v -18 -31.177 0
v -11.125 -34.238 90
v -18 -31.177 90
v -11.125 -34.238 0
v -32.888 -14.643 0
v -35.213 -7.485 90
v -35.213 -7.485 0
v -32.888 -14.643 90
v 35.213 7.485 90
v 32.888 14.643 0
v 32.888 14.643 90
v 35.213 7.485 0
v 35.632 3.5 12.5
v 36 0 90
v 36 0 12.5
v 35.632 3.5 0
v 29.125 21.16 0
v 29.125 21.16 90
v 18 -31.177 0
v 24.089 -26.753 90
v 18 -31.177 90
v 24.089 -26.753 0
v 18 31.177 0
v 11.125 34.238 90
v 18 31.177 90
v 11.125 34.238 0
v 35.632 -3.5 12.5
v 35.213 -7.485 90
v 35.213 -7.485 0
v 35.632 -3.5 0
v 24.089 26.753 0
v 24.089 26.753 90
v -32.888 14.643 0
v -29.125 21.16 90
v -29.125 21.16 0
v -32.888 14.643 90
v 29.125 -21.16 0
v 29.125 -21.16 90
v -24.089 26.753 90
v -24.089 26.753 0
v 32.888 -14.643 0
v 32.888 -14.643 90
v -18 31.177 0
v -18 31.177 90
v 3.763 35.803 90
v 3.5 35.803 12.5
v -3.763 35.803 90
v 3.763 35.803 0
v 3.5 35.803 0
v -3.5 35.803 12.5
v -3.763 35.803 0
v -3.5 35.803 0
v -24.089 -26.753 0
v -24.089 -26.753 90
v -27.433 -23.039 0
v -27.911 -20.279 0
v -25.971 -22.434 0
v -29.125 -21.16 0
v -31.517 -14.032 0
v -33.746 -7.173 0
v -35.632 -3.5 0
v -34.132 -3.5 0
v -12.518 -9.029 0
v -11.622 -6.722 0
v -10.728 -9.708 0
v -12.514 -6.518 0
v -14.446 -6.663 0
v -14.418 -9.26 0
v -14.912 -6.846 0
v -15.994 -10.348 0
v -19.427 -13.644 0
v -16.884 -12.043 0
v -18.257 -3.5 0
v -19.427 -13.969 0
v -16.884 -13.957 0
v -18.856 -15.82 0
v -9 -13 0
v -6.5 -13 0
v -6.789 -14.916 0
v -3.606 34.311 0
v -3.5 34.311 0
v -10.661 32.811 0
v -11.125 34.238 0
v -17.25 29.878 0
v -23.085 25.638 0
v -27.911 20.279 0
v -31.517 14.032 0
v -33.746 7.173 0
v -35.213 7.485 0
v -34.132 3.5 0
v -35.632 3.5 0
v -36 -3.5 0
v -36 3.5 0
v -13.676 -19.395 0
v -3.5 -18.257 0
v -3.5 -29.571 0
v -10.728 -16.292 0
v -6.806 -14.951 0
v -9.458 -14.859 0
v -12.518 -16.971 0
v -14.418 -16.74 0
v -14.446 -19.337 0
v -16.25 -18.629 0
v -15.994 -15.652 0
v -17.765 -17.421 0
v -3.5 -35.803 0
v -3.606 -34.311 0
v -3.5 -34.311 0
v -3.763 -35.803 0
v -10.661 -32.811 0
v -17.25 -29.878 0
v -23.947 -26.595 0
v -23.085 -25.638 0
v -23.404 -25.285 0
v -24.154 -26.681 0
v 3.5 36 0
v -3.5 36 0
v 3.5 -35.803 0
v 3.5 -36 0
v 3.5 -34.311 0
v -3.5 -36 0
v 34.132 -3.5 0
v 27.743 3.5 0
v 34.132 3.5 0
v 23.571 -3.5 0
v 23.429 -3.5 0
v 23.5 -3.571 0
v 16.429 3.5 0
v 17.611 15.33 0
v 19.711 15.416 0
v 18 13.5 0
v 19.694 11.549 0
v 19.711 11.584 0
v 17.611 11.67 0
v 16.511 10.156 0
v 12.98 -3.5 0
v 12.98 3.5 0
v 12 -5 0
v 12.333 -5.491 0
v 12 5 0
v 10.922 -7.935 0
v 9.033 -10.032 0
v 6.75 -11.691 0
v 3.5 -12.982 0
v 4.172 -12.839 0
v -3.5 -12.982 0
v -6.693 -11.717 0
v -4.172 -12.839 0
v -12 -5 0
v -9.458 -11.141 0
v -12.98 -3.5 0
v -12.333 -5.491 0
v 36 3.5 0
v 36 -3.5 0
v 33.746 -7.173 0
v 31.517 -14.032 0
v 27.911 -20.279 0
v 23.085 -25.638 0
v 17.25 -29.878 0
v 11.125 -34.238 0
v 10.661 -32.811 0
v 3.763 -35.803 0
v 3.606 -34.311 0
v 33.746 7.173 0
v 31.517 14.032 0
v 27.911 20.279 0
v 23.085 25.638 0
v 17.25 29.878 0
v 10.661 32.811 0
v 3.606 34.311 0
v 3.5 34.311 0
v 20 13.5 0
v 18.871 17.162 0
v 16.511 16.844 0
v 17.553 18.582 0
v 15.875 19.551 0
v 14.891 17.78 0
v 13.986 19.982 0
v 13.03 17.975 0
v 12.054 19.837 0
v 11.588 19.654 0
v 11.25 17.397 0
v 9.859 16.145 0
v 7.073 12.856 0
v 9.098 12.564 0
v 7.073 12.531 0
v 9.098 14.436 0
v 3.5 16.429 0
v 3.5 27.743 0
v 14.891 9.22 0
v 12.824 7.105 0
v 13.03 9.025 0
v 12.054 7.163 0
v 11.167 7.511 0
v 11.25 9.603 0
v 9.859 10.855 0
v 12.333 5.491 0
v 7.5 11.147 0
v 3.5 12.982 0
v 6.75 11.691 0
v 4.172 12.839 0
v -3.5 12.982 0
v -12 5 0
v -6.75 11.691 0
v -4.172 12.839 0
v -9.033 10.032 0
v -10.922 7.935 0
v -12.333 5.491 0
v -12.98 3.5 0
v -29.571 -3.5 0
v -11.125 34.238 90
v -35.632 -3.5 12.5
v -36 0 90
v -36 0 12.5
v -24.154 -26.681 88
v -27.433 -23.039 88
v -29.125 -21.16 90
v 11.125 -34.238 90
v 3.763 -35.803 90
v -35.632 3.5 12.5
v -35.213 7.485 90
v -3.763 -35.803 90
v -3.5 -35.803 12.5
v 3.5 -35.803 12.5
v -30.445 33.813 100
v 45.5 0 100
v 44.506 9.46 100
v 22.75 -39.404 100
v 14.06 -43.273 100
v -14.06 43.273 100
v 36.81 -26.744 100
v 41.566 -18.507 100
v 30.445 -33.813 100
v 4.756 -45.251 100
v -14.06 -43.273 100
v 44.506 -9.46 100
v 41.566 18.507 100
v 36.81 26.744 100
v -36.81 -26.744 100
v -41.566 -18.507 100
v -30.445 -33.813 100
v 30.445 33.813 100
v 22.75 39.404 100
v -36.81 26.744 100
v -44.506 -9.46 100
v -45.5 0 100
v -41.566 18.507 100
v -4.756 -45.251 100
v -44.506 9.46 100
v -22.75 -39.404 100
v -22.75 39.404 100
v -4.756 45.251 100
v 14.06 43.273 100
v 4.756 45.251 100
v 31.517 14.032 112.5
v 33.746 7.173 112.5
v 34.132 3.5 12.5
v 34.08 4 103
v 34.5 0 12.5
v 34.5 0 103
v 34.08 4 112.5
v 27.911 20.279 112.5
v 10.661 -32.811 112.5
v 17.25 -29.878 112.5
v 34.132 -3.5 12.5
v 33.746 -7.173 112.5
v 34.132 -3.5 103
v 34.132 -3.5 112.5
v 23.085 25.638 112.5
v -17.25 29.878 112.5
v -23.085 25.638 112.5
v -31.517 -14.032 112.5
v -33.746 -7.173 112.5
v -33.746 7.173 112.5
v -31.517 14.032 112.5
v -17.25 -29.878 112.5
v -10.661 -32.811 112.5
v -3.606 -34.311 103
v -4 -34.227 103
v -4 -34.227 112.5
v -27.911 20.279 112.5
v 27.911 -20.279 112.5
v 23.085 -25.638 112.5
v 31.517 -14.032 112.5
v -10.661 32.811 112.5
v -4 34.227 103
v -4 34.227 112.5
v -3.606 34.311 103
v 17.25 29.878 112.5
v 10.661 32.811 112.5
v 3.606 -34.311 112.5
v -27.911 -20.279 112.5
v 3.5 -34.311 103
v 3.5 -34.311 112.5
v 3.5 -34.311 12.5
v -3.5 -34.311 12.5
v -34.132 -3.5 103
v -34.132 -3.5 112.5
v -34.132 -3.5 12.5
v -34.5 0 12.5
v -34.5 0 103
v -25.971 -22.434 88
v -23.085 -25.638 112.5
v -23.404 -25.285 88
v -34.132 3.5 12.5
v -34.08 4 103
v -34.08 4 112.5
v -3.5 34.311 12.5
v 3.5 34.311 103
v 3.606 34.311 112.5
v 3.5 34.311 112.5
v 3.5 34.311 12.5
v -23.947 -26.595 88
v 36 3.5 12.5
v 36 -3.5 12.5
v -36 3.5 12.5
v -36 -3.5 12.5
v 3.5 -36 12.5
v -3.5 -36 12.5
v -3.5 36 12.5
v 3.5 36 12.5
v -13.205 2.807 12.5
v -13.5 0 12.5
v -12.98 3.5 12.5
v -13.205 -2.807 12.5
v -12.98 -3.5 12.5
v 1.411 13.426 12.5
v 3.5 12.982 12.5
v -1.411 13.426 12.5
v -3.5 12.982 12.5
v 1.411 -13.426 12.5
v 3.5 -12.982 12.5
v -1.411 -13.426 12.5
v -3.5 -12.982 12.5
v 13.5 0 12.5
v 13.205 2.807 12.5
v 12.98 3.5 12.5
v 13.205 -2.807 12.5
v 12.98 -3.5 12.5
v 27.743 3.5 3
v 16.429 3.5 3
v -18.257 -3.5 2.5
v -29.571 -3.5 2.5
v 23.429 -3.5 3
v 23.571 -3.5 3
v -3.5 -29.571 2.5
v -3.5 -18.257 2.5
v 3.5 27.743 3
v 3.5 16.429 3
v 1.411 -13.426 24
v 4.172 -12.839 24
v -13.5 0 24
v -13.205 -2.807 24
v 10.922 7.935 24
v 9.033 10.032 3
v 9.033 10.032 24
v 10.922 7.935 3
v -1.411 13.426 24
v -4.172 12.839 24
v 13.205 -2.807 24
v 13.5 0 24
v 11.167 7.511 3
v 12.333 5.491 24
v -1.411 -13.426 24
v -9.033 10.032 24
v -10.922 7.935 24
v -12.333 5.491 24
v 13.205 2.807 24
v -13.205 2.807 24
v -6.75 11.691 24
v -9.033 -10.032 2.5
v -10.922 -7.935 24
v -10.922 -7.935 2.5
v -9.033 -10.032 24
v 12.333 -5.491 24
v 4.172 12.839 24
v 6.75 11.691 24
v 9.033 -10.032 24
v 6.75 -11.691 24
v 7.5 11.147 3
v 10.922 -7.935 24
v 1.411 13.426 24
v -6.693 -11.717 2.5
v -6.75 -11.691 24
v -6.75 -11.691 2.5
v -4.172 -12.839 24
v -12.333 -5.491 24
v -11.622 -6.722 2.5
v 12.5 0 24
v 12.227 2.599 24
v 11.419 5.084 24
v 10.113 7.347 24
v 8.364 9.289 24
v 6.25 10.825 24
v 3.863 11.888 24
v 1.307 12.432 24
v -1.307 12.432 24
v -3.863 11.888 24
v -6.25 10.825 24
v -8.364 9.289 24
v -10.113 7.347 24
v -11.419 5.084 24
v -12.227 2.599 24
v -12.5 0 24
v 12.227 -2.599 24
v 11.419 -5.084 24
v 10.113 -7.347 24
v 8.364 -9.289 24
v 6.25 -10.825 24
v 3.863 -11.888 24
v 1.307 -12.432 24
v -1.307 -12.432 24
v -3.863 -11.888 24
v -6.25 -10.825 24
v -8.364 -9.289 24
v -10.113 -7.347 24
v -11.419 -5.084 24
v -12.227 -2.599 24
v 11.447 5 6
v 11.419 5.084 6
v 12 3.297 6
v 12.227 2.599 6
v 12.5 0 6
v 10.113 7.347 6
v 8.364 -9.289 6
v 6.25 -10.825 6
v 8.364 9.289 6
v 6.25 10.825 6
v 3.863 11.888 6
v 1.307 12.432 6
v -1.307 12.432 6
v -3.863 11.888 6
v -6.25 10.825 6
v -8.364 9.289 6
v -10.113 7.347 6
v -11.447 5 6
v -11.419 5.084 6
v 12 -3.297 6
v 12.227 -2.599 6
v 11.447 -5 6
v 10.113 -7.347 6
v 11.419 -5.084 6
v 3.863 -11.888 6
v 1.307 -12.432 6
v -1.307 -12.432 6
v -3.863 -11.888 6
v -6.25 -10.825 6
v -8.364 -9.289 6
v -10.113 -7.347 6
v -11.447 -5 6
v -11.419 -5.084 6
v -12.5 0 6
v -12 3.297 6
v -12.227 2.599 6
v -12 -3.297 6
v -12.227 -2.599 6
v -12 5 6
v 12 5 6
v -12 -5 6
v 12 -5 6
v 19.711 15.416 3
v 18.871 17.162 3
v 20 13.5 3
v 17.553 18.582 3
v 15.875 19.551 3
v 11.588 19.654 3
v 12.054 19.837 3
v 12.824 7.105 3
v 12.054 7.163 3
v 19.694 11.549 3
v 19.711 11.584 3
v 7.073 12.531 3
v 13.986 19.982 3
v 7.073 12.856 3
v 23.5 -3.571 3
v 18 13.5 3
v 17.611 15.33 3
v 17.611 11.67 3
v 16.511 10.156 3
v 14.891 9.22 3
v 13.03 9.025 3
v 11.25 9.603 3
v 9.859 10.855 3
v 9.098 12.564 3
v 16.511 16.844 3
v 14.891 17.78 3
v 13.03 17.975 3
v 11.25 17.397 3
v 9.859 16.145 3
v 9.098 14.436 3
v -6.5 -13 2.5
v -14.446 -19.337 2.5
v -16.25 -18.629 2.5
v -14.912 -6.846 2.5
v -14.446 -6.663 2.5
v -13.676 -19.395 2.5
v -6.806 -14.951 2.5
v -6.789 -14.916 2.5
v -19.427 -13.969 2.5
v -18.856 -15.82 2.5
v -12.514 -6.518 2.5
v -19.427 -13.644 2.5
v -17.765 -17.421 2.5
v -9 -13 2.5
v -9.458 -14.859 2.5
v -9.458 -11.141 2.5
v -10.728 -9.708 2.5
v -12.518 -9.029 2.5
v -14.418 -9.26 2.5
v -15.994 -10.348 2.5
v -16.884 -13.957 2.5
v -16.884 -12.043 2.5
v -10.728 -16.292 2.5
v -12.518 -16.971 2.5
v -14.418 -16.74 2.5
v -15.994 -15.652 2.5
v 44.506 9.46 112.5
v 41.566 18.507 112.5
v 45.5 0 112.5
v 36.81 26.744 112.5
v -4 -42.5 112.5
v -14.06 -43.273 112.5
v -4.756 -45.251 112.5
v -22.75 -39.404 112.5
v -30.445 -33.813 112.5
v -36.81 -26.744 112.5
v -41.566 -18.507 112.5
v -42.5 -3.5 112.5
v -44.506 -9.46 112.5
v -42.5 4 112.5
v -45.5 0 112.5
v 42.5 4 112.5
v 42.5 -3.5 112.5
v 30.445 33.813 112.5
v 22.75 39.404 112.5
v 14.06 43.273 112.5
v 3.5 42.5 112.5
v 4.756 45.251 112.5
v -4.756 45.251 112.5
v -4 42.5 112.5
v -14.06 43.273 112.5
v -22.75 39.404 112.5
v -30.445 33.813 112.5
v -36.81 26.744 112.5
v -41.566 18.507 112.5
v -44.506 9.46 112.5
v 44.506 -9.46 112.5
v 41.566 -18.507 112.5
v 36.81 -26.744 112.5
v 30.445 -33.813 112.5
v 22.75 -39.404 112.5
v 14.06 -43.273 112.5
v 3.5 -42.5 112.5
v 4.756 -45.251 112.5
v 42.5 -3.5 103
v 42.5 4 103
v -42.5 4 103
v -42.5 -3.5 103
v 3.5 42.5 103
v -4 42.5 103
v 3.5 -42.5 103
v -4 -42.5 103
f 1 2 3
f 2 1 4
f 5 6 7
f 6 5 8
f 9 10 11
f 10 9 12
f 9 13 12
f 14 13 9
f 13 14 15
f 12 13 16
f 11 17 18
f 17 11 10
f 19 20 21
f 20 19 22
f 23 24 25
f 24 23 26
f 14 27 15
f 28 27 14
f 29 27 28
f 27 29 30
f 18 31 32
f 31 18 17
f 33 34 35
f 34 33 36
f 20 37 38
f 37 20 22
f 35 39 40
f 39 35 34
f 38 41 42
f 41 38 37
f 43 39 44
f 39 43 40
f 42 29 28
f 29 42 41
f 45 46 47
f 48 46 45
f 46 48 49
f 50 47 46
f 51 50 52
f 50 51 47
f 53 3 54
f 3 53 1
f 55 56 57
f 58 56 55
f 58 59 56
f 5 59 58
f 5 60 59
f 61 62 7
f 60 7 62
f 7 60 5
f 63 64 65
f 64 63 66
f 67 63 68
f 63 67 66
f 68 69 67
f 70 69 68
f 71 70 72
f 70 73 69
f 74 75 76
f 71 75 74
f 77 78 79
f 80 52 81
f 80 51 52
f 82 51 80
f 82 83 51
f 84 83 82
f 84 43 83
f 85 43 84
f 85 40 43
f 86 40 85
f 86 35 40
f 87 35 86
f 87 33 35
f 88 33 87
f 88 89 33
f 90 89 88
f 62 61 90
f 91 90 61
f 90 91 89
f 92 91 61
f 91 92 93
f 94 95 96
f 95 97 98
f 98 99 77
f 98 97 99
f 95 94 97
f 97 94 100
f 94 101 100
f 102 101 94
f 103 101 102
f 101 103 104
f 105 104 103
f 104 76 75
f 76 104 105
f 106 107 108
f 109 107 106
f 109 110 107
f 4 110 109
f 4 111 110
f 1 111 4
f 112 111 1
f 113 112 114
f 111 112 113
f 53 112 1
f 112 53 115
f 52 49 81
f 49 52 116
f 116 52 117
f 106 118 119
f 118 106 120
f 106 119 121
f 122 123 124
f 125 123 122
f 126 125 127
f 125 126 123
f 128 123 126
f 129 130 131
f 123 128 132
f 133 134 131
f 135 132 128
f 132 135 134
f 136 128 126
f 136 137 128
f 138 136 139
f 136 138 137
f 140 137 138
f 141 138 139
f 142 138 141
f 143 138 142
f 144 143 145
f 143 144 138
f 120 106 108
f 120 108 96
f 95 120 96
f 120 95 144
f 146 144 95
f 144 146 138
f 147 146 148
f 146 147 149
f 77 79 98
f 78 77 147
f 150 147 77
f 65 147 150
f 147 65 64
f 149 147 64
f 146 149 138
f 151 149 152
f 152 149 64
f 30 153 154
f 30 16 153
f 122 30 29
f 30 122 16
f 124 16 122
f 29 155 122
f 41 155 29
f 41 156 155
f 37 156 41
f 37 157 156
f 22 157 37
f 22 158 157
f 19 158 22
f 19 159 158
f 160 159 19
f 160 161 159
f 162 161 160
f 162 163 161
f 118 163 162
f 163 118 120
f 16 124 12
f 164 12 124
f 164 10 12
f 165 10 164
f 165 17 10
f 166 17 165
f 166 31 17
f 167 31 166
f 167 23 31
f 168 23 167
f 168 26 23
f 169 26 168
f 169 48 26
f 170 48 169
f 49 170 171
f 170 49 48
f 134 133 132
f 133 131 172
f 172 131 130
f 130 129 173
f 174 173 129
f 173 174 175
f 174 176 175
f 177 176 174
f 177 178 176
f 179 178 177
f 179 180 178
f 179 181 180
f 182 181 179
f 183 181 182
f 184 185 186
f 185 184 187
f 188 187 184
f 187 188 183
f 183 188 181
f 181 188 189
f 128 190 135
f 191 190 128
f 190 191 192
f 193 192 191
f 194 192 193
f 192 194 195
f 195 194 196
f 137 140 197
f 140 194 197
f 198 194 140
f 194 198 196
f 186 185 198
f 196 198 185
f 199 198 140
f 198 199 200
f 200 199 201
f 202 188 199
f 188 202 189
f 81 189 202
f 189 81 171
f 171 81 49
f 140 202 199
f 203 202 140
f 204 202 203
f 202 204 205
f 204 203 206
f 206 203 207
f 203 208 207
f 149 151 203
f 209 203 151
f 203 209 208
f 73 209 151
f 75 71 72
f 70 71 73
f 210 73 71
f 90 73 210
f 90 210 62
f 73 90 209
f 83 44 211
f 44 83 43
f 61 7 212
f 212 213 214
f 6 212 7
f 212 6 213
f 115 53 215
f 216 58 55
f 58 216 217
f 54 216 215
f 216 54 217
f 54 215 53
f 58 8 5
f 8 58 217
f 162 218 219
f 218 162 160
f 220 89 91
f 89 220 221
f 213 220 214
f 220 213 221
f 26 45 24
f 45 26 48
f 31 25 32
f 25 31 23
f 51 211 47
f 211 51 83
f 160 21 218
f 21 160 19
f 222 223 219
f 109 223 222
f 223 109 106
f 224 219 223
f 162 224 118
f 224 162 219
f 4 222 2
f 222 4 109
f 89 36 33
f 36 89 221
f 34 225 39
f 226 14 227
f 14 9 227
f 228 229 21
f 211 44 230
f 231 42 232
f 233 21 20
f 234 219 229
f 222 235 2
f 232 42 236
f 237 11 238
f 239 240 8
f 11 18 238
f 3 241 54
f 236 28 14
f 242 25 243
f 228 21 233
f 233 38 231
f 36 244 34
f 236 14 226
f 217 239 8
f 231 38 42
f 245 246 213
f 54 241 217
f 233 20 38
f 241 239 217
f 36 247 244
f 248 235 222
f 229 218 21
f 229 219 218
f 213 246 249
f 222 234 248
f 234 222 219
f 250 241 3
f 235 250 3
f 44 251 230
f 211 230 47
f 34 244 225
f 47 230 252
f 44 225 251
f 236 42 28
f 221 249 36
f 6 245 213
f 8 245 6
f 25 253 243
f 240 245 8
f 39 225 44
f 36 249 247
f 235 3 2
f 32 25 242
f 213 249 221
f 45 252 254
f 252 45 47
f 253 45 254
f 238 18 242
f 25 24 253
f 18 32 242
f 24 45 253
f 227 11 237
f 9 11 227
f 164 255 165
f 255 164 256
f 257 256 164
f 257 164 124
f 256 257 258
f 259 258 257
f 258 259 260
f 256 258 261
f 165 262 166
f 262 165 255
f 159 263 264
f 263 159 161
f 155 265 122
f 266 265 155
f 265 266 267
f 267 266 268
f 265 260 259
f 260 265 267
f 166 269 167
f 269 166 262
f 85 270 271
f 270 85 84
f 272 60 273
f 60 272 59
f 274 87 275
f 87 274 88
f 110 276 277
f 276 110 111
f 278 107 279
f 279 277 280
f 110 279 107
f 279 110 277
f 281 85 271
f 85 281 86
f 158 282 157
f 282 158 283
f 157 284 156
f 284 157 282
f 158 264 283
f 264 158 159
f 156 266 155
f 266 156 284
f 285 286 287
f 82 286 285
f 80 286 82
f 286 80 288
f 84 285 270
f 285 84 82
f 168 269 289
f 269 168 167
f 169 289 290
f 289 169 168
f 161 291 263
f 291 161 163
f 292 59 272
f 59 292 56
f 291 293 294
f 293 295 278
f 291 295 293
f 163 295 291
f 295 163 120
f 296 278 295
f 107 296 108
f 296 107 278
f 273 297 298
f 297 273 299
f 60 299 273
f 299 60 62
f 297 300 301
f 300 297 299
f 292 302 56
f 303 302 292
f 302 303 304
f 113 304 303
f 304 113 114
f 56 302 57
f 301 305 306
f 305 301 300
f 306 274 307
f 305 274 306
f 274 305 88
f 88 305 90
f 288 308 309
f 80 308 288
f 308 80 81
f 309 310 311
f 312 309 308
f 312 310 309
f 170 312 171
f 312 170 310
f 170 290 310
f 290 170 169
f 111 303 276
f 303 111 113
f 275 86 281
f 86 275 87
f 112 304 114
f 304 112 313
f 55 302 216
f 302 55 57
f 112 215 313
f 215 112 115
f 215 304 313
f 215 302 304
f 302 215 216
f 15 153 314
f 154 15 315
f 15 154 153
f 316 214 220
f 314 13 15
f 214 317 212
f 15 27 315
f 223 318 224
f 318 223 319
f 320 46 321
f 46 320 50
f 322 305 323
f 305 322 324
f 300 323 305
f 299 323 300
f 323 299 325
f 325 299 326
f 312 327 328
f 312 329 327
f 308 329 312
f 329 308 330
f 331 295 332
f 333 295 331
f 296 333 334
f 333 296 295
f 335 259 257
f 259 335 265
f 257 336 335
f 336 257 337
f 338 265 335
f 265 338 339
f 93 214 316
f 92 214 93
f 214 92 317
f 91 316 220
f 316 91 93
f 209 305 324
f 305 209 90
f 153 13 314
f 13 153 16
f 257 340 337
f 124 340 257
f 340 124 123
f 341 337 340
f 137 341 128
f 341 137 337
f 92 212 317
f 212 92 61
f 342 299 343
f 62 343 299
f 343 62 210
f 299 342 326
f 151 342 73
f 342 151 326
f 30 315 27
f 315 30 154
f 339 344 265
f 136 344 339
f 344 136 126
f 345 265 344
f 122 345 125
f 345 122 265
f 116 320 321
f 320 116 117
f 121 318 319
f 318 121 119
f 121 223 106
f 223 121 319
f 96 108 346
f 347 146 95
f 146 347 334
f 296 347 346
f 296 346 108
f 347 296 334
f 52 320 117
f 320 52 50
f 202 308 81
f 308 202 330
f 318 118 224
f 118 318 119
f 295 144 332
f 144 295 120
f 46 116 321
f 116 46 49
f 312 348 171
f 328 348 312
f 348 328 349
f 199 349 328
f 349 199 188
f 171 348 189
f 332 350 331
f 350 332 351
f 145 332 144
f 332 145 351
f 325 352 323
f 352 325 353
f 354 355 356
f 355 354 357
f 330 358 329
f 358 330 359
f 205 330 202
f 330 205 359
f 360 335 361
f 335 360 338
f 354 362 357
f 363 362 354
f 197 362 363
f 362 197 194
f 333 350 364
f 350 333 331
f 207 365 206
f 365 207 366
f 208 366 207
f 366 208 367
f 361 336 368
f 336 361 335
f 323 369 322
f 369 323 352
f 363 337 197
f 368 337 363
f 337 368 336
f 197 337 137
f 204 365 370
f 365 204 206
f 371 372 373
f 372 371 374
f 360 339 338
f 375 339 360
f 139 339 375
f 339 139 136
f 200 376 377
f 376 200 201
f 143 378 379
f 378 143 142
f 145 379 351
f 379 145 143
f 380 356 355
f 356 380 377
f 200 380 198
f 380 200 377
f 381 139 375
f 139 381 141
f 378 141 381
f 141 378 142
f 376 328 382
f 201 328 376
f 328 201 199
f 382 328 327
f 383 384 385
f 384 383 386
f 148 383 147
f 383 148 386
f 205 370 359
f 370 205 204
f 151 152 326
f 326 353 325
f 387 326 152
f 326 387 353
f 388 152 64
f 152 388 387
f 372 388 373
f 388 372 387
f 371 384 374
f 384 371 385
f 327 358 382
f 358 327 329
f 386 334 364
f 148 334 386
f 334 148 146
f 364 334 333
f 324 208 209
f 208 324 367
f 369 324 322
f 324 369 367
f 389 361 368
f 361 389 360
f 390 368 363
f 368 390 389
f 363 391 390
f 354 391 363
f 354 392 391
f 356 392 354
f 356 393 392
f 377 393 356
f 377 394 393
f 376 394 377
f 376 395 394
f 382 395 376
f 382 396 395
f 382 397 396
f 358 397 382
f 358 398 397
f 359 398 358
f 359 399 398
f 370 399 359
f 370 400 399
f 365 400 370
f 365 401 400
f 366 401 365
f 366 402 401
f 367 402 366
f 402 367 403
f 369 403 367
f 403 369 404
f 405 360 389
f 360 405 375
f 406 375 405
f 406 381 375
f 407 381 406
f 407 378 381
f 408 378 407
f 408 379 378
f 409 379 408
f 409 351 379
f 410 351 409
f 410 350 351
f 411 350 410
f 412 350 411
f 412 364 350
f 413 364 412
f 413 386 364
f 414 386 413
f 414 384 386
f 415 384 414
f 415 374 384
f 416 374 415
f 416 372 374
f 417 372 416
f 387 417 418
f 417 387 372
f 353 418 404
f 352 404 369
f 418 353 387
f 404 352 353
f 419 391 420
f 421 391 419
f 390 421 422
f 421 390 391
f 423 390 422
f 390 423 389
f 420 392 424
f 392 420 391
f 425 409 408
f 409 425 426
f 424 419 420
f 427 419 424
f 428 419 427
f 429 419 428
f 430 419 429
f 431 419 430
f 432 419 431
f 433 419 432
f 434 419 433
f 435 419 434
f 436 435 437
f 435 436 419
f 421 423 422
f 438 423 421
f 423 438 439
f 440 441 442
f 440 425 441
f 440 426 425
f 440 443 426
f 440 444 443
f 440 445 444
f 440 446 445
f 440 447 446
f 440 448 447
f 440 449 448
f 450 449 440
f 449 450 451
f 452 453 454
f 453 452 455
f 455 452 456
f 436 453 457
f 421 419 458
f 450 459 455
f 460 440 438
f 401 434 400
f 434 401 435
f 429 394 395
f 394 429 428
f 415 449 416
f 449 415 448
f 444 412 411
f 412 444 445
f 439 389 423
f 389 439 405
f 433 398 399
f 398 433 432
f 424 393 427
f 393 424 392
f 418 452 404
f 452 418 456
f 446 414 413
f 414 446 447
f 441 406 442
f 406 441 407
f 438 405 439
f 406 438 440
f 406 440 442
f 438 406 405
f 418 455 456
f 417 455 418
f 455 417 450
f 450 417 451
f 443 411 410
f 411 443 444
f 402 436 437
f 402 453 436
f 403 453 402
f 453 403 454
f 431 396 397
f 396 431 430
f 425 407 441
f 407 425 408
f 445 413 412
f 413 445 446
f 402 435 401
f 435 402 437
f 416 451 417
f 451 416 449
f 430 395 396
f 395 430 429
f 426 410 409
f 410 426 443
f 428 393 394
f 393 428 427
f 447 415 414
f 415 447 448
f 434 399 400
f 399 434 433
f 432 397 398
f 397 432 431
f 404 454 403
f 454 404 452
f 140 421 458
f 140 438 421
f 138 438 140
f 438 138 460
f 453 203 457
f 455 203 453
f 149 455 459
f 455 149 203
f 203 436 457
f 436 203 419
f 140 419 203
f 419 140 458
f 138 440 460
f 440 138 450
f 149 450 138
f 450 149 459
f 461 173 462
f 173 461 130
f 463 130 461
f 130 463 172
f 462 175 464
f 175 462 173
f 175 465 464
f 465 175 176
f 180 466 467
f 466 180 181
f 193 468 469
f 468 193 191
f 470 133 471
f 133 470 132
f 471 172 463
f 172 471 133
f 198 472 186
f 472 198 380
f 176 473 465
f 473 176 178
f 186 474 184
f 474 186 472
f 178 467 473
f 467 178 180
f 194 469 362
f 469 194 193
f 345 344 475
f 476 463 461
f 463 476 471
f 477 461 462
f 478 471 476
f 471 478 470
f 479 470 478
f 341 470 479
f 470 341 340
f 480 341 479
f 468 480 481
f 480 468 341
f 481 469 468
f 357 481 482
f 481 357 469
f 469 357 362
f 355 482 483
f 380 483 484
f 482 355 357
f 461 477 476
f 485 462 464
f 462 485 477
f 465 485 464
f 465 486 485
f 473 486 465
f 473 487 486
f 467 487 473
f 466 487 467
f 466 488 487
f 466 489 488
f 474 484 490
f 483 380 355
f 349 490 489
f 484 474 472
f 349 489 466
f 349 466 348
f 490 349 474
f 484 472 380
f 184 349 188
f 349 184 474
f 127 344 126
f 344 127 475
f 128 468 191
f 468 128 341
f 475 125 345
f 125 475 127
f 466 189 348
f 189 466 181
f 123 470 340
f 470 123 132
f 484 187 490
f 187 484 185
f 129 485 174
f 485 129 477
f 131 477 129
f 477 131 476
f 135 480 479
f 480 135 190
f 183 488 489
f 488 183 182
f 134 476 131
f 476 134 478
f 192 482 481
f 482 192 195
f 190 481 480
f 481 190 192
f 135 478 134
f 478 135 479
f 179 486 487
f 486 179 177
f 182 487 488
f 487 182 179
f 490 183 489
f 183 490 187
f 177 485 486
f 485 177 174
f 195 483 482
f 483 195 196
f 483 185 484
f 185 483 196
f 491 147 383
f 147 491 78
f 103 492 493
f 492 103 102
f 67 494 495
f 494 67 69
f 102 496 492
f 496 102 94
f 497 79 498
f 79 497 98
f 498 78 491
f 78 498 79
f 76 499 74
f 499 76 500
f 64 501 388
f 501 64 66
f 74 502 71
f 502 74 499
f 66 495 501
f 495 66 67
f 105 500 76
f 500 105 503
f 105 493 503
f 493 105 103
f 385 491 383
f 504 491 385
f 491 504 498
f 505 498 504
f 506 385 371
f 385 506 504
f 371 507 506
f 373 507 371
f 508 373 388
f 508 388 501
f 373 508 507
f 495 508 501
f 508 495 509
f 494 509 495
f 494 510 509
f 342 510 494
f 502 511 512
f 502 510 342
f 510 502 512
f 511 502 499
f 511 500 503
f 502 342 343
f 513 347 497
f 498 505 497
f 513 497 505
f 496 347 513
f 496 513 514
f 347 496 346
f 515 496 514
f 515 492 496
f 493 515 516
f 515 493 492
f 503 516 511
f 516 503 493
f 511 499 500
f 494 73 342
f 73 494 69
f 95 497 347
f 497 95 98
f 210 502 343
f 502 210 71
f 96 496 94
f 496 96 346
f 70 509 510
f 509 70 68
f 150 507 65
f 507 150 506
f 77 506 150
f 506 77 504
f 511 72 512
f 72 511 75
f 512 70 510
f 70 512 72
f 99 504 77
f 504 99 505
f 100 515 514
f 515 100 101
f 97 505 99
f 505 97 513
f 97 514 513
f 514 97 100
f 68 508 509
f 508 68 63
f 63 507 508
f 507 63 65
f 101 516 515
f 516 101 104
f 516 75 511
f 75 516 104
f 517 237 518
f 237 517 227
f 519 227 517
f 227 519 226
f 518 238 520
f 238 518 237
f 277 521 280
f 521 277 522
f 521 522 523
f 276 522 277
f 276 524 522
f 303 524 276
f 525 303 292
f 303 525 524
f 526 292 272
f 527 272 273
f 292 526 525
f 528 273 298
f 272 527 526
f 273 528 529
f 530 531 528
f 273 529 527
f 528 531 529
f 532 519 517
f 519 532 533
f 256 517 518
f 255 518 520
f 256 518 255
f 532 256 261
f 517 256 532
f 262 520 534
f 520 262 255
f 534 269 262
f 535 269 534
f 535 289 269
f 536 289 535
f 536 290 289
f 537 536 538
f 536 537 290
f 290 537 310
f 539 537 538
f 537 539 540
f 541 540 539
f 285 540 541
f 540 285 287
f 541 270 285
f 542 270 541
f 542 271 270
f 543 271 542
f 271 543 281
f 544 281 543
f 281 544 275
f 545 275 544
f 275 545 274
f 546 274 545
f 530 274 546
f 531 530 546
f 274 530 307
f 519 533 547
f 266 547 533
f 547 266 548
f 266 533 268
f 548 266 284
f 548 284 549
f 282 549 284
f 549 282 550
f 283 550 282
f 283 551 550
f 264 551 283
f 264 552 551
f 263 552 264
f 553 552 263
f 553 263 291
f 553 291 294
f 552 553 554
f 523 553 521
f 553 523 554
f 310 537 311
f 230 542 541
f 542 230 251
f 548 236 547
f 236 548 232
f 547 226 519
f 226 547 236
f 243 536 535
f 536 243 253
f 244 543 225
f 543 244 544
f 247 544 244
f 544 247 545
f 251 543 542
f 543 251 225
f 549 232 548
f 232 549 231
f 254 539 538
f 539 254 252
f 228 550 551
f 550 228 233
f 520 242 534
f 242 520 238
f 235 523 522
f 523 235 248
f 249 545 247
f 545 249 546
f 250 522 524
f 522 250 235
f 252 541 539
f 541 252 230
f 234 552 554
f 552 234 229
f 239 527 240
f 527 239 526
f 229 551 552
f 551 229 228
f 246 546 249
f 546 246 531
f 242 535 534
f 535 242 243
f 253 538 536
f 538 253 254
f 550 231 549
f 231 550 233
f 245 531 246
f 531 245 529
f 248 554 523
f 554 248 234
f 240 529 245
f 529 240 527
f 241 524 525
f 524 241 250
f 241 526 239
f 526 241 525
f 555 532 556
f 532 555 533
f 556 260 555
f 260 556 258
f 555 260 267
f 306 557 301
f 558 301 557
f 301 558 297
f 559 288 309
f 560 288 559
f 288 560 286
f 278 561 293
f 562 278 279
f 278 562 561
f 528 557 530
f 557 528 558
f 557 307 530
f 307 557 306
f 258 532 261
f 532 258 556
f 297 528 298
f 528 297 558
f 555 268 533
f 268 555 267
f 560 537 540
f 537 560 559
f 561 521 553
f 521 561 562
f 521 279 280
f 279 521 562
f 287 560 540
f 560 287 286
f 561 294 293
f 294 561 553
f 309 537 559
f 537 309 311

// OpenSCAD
// file: ../components/led.scad
module led(diameter, height, tolerance){
    
    // Add tolerance.
    total_diameter = diameter+tolerance;
    
    // Derive remaining dimensions from the overall measurements.
    lip_radius = total_diameter/2;
    lip_height = 2; // TODO: this probably shouldn't be hard-coded.
    body_radius = (total_diameter-.5)/2;
    dome_radius = body_radius;
    body_height = height-dome_radius;
    
    color("red"){
        // Body.
        cylinder(r=body_radius,h=body_height);
        // Lip.
        cylinder(r=lip_radius,h=lip_height);
        // Dome.
        //translate([0,0,LED_HEIGHT-(LED_DIAMETER/2)]){
        translate([0,0,height-body_radius]){
            sphere(r=dome_radius);
        }
    }
    // Leads.
    color("gray"){
        translate([0,2,-10]){
            cylinder(r=.5,h=10);
        }
        translate([0,-2,-12]){
            cylinder(r=.5,h=12);
        }
    }
}

// Example.
//led(10,13.7,1);
// main file
include <../components/led.scad>

/*
    Electronic "tiki torch" flame module
    
    TODO:
    * Revisit LED wire routing channel (tape isn't great)
    
    Standard canister measurements:
    
    can diameter: ~73mm
    can height: ~112mm
    top height: ~9.5mm
    top diameter: ~91mm
    second top height: ~9.8mm
    second top diameter: ~50mm
    third top height: 8.5mm
    third top di"../components/led.scad"ameter: ~30mm
    
    Wiring notes:
    * red: power in positive (90mm)
    * green: power in gnd (70mm)
    * yellow: motor + (note: wired to - terminal on my motors) (85mm)
    * black: motor - (60mm)
    * LED +/- connected in parallel with power in
*/

CAN_DIAMETER = 72; //73;
CAN_HEIGHT = 100;//112;
FLANGE_DIAMETER = 91;
FLANGE_HEIGHT = 12.5;//9.5;
THREAD_TOP_DIAMETER = 50;
THREAD_TOP_HEIGHT = 9.8;
TIP_DIAMETER = 30;
TIP_HEIGHT = 8.5;

FAN_DEPTH = 20;

MOTOR_DIAMETER = 24;
MOTOR_LENGTH = 30;

WALL_THICKNESS = 3;
TOLERANCE = 1;

// Rotates object around specified point
module rotate_about_pt(z, y, pt) {
    translate(pt)
        rotate([0, y, z])
            translate(-pt)
                children();   
}

// Basic replica of standard fuel canister (for referenece)
module stock_tiki(){
    cylinder(r=CAN_DIAMETER/2,h=CAN_HEIGHT);
    translate([0,0,CAN_HEIGHT]){
        cylinder(r=FLANGE_DIAMETER/2,h=FLANGE_HEIGHT);
        translate([0,0,FLANGE_HEIGHT]){
            cylinder(r=THREAD_TOP_DIAMETER/2,h=THREAD_TOP_HEIGHT);
            translate([0,0,THREAD_TOP_HEIGHT]){
                cylinder(r=TIP_DIAMETER/2,h=TIP_HEIGHT);
            }
        }
    }
}

module fan(){
    
    // A fan with the following constraints:
    // * Flow over pressure
    // * Fits into canister
    // * Works with an off-the-shelf motor (ideally ~3vdc)
    // * Prints without supports
    
    HUB_HEIGHT = 5;
    MOTOR_SHAFT_DIAMETER = 2;
    BLADE_LENGTH = (CAN_DIAMETER/2)-WALL_THICKNESS-TOLERANCE;
    
    $fn=25;
    
    difference(){
        union(){
            
            // hub
            translate([0,0,-.3]){
                cylinder(r=5,h=6);
            }
            
            // blades
            translate([0,0,2.5]){
                rotate([90,30,0]){
                    difference(){
                        resize([10,0,0]){
                            cylinder(r=3/2,h=BLADE_LENGTH);
                        }
                        translate([-2,-0.75,0]){
                            resize([14,0,0]){
                                cylinder(r=3/2,h=BLADE_LENGTH);
                            }
                        }
                    }
                }
            }
            
            translate([0,0,2.5]){
                rotate([90,30,90]){
                    difference(){
                        resize([10,0,0]){
                            cylinder(r=3/2,h=BLADE_LENGTH);
                        }
                        translate([-2,-0.75,0]){
                            resize([14,0,0]){
                                cylinder(r=3/2,h=BLADE_LENGTH);
                            }
                        }
                    }
                }
            }
            
            translate([0,0,2.5]){
                rotate([90,30,180]){
                    difference(){
                        resize([10,0,0]){
                            cylinder(r=3/2,h=BLADE_LENGTH);
                        }
                        translate([-2,-0.75,0]){
                            resize([14,0,0]){
                                cylinder(r=3/2,h=BLADE_LENGTH);
                            }
                        }
                    }
                }
            }
            
            translate([0,0,2.5]){
                rotate([90,30,270]){
                    difference(){
                        resize([10,0,0]){
                            cylinder(r=3/2,h=BLADE_LENGTH);
                        }
                        translate([-2,-0.75,0]){
                            resize([14,0,0]){
                                cylinder(r=3/2,h=BLADE_LENGTH);
                            }
                        }
                    }
                }
            }            
        }
        
        // motor shaft hole
        translate([0,0,-1]){
            cylinder(r=MOTOR_SHAFT_DIAMETER/2,h=HUB_HEIGHT*2);
        }
    }
}

// Fan test
//fan();

module flame_holder(){
    difference(){
        // top flange
        difference(){
            cylinder(r=FLANGE_DIAMETER/2,h=FLANGE_HEIGHT);
            cylinder(r=(CAN_DIAMETER-WALL_THICKNESS)/2,h=FLANGE_HEIGHT);
        }
        
        // Cloth holder mounts
        translate([-(FLANGE_DIAMETER/2)+(WALL_THICKNESS),-WALL_THICKNESS-(TOLERANCE/2),WALL_THICKNESS]){
            cube([FLANGE_DIAMETER-(WALL_THICKNESS*2),(WALL_THICKNESS*2)+TOLERANCE+0.5,FLANGE_HEIGHT]);
            
            rotate_about_pt(90,0,[(FLANGE_DIAMETER-(WALL_THICKNESS*2))/2,WALL_THICKNESS+(TOLERANCE/2)]){
                cube([FLANGE_DIAMETER-(WALL_THICKNESS*2),(WALL_THICKNESS*2)+TOLERANCE+0.5,FLANGE_HEIGHT]);
            }
        }
    }
}

// Flame holder test
//flame_holder();

module flame_clamp(){
        
    // Cloth holder
    difference(){
        union(){
            cube([FLANGE_DIAMETER-(WALL_THICKNESS*3),(WALL_THICKNESS*2)+1,FLANGE_HEIGHT-WALL_THICKNESS]);
            
            // LED mount
            translate([((FLANGE_DIAMETER-(WALL_THICKNESS*3))/2)-10,-2.5,0]){
                cylinder(r=12/2,h=9.5);
            }
        }
        
        // Groove for fabric
        translate([WALL_THICKNESS,WALL_THICKNESS-((WALL_THICKNESS/4)-1),0]){
            cube([FLANGE_DIAMETER-(WALL_THICKNESS*2),WALL_THICKNESS/4,FLANGE_HEIGHT]);
        }
        
        // Hole for LED mount
        translate([((FLANGE_DIAMETER-(WALL_THICKNESS*3))/2)-10,-2.5,0]){
            cylinder(r=10/2,h=10);
        }
        
        // Notch the center so two can overlap
        translate([((FLANGE_DIAMETER-(WALL_THICKNESS*3))/2)-WALL_THICKNESS,0,FLANGE_HEIGHT/2]){
            cube([(WALL_THICKNESS*2)+1,(WALL_THICKNESS*2)+1,FLANGE_HEIGHT/2]);
        }
    }
}

// Flame clamps test
//flame_clamp();


module motor_mount(){    
    difference(){
        union(){
            translate([-(CAN_DIAMETER/2),-WALL_THICKNESS-(TOLERANCE/2),0]){
                cube([CAN_DIAMETER,(WALL_THICKNESS*2)+TOLERANCE,FLANGE_HEIGHT]);
                
                rotate_about_pt(90,0,[CAN_DIAMETER/2,WALL_THICKNESS+(TOLERANCE/2)]){
                    cube([CAN_DIAMETER,(WALL_THICKNESS*2)+TOLERANCE,FLANGE_HEIGHT]);
                }
            }
            cylinder(r=(MOTOR_DIAMETER+WALL_THICKNESS)/2,h=MOTOR_LENGTH*0.80);
        }        
        
        translate([0,0,WALL_THICKNESS*2]){
            cylinder(r=(MOTOR_DIAMETER+TOLERANCE)/2,h=MOTOR_LENGTH);
        }
        
        // Hole for wires
        translate([-MOTOR_DIAMETER/2,-10/2,0]){
            cube([MOTOR_DIAMETER,10,WALL_THICKNESS*2]);
        }        
    }
    
    // TODO: Move all these magic numbers up into constants
    
    // DC jack mount
    // depth: 3mm, diameter: 8mm
    translate([(MOTOR_DIAMETER/2)+1.5,(MOTOR_DIAMETER/2)+1.5,0]){
        difference(){
            union(){
                cylinder(r=(10+WALL_THICKNESS)/2,h=3);
                translate([5,-15,0]){
                    rotate_about_pt(45,0,[5,5]){
                        cube([8,38,3]);
                    }
                }
            }
            cylinder(r=(8+TOLERANCE)/2,h=3);
        }
    }
    
    // Speed control mount
    // depth: 2.5mm, diameter: 7mm
    translate([-(MOTOR_DIAMETER/2)-1,-(MOTOR_DIAMETER/2)-1,0]){
        difference(){
            union(){
                cylinder(r=(10+WALL_THICKNESS)/2,h=2.5);
                translate([5,-15,0]){
                    rotate_about_pt(45,0,[5,5]){
                        cube([8,38,2.5]);
                    }
                }
            }
            cylinder(r=(7+TOLERANCE)/2,h=3);
        }
    }    
}

// Motor mount test
//motor_mount();


// Assemble!
// TODO: Can should be a specific module or perhaps grouped with flame holder
union(){
    difference(){
        union(){
            cylinder(r=CAN_DIAMETER/2,h=CAN_HEIGHT);
            translate([0,0,CAN_HEIGHT-10]){
                cylinder(r1=CAN_DIAMETER/2,r2=FLANGE_DIAMETER/2,h=10);
            }
        }

        translate([0,0,0]){
            cylinder(r=(CAN_DIAMETER-WALL_THICKNESS)/2,h=CAN_HEIGHT+WALL_THICKNESS);
        }
        
        // Add a channel for LED wires
       translate([-CAN_DIAMETER/2.8,-CAN_DIAMETER/2.9,0]){
            cylinder(r=2.5,h=CAN_HEIGHT-12);
        }

    }

    motor_mount();

    translate([0,0,CAN_HEIGHT]){
        flame_holder();
    }
}
/*
translate([0,0,MOTOR_LENGTH]){
    fan();
}
*/
/*
translate([-(CAN_DIAMETER/2)-(WALL_THICKNESS*1.5),-WALL_THICKNESS,CAN_HEIGHT+3]){
    flame_clamp();
    translate([0,0,10]){
        rotate_about_pt(90,0,[(FLANGE_DIAMETER-(WALL_THICKNESS*3))/2,WALL_THICKNESS]){
            // TODO: Figure out how to get this to rotate 180 around Y
            flame_clamp();          
        }
    }
}
*/
